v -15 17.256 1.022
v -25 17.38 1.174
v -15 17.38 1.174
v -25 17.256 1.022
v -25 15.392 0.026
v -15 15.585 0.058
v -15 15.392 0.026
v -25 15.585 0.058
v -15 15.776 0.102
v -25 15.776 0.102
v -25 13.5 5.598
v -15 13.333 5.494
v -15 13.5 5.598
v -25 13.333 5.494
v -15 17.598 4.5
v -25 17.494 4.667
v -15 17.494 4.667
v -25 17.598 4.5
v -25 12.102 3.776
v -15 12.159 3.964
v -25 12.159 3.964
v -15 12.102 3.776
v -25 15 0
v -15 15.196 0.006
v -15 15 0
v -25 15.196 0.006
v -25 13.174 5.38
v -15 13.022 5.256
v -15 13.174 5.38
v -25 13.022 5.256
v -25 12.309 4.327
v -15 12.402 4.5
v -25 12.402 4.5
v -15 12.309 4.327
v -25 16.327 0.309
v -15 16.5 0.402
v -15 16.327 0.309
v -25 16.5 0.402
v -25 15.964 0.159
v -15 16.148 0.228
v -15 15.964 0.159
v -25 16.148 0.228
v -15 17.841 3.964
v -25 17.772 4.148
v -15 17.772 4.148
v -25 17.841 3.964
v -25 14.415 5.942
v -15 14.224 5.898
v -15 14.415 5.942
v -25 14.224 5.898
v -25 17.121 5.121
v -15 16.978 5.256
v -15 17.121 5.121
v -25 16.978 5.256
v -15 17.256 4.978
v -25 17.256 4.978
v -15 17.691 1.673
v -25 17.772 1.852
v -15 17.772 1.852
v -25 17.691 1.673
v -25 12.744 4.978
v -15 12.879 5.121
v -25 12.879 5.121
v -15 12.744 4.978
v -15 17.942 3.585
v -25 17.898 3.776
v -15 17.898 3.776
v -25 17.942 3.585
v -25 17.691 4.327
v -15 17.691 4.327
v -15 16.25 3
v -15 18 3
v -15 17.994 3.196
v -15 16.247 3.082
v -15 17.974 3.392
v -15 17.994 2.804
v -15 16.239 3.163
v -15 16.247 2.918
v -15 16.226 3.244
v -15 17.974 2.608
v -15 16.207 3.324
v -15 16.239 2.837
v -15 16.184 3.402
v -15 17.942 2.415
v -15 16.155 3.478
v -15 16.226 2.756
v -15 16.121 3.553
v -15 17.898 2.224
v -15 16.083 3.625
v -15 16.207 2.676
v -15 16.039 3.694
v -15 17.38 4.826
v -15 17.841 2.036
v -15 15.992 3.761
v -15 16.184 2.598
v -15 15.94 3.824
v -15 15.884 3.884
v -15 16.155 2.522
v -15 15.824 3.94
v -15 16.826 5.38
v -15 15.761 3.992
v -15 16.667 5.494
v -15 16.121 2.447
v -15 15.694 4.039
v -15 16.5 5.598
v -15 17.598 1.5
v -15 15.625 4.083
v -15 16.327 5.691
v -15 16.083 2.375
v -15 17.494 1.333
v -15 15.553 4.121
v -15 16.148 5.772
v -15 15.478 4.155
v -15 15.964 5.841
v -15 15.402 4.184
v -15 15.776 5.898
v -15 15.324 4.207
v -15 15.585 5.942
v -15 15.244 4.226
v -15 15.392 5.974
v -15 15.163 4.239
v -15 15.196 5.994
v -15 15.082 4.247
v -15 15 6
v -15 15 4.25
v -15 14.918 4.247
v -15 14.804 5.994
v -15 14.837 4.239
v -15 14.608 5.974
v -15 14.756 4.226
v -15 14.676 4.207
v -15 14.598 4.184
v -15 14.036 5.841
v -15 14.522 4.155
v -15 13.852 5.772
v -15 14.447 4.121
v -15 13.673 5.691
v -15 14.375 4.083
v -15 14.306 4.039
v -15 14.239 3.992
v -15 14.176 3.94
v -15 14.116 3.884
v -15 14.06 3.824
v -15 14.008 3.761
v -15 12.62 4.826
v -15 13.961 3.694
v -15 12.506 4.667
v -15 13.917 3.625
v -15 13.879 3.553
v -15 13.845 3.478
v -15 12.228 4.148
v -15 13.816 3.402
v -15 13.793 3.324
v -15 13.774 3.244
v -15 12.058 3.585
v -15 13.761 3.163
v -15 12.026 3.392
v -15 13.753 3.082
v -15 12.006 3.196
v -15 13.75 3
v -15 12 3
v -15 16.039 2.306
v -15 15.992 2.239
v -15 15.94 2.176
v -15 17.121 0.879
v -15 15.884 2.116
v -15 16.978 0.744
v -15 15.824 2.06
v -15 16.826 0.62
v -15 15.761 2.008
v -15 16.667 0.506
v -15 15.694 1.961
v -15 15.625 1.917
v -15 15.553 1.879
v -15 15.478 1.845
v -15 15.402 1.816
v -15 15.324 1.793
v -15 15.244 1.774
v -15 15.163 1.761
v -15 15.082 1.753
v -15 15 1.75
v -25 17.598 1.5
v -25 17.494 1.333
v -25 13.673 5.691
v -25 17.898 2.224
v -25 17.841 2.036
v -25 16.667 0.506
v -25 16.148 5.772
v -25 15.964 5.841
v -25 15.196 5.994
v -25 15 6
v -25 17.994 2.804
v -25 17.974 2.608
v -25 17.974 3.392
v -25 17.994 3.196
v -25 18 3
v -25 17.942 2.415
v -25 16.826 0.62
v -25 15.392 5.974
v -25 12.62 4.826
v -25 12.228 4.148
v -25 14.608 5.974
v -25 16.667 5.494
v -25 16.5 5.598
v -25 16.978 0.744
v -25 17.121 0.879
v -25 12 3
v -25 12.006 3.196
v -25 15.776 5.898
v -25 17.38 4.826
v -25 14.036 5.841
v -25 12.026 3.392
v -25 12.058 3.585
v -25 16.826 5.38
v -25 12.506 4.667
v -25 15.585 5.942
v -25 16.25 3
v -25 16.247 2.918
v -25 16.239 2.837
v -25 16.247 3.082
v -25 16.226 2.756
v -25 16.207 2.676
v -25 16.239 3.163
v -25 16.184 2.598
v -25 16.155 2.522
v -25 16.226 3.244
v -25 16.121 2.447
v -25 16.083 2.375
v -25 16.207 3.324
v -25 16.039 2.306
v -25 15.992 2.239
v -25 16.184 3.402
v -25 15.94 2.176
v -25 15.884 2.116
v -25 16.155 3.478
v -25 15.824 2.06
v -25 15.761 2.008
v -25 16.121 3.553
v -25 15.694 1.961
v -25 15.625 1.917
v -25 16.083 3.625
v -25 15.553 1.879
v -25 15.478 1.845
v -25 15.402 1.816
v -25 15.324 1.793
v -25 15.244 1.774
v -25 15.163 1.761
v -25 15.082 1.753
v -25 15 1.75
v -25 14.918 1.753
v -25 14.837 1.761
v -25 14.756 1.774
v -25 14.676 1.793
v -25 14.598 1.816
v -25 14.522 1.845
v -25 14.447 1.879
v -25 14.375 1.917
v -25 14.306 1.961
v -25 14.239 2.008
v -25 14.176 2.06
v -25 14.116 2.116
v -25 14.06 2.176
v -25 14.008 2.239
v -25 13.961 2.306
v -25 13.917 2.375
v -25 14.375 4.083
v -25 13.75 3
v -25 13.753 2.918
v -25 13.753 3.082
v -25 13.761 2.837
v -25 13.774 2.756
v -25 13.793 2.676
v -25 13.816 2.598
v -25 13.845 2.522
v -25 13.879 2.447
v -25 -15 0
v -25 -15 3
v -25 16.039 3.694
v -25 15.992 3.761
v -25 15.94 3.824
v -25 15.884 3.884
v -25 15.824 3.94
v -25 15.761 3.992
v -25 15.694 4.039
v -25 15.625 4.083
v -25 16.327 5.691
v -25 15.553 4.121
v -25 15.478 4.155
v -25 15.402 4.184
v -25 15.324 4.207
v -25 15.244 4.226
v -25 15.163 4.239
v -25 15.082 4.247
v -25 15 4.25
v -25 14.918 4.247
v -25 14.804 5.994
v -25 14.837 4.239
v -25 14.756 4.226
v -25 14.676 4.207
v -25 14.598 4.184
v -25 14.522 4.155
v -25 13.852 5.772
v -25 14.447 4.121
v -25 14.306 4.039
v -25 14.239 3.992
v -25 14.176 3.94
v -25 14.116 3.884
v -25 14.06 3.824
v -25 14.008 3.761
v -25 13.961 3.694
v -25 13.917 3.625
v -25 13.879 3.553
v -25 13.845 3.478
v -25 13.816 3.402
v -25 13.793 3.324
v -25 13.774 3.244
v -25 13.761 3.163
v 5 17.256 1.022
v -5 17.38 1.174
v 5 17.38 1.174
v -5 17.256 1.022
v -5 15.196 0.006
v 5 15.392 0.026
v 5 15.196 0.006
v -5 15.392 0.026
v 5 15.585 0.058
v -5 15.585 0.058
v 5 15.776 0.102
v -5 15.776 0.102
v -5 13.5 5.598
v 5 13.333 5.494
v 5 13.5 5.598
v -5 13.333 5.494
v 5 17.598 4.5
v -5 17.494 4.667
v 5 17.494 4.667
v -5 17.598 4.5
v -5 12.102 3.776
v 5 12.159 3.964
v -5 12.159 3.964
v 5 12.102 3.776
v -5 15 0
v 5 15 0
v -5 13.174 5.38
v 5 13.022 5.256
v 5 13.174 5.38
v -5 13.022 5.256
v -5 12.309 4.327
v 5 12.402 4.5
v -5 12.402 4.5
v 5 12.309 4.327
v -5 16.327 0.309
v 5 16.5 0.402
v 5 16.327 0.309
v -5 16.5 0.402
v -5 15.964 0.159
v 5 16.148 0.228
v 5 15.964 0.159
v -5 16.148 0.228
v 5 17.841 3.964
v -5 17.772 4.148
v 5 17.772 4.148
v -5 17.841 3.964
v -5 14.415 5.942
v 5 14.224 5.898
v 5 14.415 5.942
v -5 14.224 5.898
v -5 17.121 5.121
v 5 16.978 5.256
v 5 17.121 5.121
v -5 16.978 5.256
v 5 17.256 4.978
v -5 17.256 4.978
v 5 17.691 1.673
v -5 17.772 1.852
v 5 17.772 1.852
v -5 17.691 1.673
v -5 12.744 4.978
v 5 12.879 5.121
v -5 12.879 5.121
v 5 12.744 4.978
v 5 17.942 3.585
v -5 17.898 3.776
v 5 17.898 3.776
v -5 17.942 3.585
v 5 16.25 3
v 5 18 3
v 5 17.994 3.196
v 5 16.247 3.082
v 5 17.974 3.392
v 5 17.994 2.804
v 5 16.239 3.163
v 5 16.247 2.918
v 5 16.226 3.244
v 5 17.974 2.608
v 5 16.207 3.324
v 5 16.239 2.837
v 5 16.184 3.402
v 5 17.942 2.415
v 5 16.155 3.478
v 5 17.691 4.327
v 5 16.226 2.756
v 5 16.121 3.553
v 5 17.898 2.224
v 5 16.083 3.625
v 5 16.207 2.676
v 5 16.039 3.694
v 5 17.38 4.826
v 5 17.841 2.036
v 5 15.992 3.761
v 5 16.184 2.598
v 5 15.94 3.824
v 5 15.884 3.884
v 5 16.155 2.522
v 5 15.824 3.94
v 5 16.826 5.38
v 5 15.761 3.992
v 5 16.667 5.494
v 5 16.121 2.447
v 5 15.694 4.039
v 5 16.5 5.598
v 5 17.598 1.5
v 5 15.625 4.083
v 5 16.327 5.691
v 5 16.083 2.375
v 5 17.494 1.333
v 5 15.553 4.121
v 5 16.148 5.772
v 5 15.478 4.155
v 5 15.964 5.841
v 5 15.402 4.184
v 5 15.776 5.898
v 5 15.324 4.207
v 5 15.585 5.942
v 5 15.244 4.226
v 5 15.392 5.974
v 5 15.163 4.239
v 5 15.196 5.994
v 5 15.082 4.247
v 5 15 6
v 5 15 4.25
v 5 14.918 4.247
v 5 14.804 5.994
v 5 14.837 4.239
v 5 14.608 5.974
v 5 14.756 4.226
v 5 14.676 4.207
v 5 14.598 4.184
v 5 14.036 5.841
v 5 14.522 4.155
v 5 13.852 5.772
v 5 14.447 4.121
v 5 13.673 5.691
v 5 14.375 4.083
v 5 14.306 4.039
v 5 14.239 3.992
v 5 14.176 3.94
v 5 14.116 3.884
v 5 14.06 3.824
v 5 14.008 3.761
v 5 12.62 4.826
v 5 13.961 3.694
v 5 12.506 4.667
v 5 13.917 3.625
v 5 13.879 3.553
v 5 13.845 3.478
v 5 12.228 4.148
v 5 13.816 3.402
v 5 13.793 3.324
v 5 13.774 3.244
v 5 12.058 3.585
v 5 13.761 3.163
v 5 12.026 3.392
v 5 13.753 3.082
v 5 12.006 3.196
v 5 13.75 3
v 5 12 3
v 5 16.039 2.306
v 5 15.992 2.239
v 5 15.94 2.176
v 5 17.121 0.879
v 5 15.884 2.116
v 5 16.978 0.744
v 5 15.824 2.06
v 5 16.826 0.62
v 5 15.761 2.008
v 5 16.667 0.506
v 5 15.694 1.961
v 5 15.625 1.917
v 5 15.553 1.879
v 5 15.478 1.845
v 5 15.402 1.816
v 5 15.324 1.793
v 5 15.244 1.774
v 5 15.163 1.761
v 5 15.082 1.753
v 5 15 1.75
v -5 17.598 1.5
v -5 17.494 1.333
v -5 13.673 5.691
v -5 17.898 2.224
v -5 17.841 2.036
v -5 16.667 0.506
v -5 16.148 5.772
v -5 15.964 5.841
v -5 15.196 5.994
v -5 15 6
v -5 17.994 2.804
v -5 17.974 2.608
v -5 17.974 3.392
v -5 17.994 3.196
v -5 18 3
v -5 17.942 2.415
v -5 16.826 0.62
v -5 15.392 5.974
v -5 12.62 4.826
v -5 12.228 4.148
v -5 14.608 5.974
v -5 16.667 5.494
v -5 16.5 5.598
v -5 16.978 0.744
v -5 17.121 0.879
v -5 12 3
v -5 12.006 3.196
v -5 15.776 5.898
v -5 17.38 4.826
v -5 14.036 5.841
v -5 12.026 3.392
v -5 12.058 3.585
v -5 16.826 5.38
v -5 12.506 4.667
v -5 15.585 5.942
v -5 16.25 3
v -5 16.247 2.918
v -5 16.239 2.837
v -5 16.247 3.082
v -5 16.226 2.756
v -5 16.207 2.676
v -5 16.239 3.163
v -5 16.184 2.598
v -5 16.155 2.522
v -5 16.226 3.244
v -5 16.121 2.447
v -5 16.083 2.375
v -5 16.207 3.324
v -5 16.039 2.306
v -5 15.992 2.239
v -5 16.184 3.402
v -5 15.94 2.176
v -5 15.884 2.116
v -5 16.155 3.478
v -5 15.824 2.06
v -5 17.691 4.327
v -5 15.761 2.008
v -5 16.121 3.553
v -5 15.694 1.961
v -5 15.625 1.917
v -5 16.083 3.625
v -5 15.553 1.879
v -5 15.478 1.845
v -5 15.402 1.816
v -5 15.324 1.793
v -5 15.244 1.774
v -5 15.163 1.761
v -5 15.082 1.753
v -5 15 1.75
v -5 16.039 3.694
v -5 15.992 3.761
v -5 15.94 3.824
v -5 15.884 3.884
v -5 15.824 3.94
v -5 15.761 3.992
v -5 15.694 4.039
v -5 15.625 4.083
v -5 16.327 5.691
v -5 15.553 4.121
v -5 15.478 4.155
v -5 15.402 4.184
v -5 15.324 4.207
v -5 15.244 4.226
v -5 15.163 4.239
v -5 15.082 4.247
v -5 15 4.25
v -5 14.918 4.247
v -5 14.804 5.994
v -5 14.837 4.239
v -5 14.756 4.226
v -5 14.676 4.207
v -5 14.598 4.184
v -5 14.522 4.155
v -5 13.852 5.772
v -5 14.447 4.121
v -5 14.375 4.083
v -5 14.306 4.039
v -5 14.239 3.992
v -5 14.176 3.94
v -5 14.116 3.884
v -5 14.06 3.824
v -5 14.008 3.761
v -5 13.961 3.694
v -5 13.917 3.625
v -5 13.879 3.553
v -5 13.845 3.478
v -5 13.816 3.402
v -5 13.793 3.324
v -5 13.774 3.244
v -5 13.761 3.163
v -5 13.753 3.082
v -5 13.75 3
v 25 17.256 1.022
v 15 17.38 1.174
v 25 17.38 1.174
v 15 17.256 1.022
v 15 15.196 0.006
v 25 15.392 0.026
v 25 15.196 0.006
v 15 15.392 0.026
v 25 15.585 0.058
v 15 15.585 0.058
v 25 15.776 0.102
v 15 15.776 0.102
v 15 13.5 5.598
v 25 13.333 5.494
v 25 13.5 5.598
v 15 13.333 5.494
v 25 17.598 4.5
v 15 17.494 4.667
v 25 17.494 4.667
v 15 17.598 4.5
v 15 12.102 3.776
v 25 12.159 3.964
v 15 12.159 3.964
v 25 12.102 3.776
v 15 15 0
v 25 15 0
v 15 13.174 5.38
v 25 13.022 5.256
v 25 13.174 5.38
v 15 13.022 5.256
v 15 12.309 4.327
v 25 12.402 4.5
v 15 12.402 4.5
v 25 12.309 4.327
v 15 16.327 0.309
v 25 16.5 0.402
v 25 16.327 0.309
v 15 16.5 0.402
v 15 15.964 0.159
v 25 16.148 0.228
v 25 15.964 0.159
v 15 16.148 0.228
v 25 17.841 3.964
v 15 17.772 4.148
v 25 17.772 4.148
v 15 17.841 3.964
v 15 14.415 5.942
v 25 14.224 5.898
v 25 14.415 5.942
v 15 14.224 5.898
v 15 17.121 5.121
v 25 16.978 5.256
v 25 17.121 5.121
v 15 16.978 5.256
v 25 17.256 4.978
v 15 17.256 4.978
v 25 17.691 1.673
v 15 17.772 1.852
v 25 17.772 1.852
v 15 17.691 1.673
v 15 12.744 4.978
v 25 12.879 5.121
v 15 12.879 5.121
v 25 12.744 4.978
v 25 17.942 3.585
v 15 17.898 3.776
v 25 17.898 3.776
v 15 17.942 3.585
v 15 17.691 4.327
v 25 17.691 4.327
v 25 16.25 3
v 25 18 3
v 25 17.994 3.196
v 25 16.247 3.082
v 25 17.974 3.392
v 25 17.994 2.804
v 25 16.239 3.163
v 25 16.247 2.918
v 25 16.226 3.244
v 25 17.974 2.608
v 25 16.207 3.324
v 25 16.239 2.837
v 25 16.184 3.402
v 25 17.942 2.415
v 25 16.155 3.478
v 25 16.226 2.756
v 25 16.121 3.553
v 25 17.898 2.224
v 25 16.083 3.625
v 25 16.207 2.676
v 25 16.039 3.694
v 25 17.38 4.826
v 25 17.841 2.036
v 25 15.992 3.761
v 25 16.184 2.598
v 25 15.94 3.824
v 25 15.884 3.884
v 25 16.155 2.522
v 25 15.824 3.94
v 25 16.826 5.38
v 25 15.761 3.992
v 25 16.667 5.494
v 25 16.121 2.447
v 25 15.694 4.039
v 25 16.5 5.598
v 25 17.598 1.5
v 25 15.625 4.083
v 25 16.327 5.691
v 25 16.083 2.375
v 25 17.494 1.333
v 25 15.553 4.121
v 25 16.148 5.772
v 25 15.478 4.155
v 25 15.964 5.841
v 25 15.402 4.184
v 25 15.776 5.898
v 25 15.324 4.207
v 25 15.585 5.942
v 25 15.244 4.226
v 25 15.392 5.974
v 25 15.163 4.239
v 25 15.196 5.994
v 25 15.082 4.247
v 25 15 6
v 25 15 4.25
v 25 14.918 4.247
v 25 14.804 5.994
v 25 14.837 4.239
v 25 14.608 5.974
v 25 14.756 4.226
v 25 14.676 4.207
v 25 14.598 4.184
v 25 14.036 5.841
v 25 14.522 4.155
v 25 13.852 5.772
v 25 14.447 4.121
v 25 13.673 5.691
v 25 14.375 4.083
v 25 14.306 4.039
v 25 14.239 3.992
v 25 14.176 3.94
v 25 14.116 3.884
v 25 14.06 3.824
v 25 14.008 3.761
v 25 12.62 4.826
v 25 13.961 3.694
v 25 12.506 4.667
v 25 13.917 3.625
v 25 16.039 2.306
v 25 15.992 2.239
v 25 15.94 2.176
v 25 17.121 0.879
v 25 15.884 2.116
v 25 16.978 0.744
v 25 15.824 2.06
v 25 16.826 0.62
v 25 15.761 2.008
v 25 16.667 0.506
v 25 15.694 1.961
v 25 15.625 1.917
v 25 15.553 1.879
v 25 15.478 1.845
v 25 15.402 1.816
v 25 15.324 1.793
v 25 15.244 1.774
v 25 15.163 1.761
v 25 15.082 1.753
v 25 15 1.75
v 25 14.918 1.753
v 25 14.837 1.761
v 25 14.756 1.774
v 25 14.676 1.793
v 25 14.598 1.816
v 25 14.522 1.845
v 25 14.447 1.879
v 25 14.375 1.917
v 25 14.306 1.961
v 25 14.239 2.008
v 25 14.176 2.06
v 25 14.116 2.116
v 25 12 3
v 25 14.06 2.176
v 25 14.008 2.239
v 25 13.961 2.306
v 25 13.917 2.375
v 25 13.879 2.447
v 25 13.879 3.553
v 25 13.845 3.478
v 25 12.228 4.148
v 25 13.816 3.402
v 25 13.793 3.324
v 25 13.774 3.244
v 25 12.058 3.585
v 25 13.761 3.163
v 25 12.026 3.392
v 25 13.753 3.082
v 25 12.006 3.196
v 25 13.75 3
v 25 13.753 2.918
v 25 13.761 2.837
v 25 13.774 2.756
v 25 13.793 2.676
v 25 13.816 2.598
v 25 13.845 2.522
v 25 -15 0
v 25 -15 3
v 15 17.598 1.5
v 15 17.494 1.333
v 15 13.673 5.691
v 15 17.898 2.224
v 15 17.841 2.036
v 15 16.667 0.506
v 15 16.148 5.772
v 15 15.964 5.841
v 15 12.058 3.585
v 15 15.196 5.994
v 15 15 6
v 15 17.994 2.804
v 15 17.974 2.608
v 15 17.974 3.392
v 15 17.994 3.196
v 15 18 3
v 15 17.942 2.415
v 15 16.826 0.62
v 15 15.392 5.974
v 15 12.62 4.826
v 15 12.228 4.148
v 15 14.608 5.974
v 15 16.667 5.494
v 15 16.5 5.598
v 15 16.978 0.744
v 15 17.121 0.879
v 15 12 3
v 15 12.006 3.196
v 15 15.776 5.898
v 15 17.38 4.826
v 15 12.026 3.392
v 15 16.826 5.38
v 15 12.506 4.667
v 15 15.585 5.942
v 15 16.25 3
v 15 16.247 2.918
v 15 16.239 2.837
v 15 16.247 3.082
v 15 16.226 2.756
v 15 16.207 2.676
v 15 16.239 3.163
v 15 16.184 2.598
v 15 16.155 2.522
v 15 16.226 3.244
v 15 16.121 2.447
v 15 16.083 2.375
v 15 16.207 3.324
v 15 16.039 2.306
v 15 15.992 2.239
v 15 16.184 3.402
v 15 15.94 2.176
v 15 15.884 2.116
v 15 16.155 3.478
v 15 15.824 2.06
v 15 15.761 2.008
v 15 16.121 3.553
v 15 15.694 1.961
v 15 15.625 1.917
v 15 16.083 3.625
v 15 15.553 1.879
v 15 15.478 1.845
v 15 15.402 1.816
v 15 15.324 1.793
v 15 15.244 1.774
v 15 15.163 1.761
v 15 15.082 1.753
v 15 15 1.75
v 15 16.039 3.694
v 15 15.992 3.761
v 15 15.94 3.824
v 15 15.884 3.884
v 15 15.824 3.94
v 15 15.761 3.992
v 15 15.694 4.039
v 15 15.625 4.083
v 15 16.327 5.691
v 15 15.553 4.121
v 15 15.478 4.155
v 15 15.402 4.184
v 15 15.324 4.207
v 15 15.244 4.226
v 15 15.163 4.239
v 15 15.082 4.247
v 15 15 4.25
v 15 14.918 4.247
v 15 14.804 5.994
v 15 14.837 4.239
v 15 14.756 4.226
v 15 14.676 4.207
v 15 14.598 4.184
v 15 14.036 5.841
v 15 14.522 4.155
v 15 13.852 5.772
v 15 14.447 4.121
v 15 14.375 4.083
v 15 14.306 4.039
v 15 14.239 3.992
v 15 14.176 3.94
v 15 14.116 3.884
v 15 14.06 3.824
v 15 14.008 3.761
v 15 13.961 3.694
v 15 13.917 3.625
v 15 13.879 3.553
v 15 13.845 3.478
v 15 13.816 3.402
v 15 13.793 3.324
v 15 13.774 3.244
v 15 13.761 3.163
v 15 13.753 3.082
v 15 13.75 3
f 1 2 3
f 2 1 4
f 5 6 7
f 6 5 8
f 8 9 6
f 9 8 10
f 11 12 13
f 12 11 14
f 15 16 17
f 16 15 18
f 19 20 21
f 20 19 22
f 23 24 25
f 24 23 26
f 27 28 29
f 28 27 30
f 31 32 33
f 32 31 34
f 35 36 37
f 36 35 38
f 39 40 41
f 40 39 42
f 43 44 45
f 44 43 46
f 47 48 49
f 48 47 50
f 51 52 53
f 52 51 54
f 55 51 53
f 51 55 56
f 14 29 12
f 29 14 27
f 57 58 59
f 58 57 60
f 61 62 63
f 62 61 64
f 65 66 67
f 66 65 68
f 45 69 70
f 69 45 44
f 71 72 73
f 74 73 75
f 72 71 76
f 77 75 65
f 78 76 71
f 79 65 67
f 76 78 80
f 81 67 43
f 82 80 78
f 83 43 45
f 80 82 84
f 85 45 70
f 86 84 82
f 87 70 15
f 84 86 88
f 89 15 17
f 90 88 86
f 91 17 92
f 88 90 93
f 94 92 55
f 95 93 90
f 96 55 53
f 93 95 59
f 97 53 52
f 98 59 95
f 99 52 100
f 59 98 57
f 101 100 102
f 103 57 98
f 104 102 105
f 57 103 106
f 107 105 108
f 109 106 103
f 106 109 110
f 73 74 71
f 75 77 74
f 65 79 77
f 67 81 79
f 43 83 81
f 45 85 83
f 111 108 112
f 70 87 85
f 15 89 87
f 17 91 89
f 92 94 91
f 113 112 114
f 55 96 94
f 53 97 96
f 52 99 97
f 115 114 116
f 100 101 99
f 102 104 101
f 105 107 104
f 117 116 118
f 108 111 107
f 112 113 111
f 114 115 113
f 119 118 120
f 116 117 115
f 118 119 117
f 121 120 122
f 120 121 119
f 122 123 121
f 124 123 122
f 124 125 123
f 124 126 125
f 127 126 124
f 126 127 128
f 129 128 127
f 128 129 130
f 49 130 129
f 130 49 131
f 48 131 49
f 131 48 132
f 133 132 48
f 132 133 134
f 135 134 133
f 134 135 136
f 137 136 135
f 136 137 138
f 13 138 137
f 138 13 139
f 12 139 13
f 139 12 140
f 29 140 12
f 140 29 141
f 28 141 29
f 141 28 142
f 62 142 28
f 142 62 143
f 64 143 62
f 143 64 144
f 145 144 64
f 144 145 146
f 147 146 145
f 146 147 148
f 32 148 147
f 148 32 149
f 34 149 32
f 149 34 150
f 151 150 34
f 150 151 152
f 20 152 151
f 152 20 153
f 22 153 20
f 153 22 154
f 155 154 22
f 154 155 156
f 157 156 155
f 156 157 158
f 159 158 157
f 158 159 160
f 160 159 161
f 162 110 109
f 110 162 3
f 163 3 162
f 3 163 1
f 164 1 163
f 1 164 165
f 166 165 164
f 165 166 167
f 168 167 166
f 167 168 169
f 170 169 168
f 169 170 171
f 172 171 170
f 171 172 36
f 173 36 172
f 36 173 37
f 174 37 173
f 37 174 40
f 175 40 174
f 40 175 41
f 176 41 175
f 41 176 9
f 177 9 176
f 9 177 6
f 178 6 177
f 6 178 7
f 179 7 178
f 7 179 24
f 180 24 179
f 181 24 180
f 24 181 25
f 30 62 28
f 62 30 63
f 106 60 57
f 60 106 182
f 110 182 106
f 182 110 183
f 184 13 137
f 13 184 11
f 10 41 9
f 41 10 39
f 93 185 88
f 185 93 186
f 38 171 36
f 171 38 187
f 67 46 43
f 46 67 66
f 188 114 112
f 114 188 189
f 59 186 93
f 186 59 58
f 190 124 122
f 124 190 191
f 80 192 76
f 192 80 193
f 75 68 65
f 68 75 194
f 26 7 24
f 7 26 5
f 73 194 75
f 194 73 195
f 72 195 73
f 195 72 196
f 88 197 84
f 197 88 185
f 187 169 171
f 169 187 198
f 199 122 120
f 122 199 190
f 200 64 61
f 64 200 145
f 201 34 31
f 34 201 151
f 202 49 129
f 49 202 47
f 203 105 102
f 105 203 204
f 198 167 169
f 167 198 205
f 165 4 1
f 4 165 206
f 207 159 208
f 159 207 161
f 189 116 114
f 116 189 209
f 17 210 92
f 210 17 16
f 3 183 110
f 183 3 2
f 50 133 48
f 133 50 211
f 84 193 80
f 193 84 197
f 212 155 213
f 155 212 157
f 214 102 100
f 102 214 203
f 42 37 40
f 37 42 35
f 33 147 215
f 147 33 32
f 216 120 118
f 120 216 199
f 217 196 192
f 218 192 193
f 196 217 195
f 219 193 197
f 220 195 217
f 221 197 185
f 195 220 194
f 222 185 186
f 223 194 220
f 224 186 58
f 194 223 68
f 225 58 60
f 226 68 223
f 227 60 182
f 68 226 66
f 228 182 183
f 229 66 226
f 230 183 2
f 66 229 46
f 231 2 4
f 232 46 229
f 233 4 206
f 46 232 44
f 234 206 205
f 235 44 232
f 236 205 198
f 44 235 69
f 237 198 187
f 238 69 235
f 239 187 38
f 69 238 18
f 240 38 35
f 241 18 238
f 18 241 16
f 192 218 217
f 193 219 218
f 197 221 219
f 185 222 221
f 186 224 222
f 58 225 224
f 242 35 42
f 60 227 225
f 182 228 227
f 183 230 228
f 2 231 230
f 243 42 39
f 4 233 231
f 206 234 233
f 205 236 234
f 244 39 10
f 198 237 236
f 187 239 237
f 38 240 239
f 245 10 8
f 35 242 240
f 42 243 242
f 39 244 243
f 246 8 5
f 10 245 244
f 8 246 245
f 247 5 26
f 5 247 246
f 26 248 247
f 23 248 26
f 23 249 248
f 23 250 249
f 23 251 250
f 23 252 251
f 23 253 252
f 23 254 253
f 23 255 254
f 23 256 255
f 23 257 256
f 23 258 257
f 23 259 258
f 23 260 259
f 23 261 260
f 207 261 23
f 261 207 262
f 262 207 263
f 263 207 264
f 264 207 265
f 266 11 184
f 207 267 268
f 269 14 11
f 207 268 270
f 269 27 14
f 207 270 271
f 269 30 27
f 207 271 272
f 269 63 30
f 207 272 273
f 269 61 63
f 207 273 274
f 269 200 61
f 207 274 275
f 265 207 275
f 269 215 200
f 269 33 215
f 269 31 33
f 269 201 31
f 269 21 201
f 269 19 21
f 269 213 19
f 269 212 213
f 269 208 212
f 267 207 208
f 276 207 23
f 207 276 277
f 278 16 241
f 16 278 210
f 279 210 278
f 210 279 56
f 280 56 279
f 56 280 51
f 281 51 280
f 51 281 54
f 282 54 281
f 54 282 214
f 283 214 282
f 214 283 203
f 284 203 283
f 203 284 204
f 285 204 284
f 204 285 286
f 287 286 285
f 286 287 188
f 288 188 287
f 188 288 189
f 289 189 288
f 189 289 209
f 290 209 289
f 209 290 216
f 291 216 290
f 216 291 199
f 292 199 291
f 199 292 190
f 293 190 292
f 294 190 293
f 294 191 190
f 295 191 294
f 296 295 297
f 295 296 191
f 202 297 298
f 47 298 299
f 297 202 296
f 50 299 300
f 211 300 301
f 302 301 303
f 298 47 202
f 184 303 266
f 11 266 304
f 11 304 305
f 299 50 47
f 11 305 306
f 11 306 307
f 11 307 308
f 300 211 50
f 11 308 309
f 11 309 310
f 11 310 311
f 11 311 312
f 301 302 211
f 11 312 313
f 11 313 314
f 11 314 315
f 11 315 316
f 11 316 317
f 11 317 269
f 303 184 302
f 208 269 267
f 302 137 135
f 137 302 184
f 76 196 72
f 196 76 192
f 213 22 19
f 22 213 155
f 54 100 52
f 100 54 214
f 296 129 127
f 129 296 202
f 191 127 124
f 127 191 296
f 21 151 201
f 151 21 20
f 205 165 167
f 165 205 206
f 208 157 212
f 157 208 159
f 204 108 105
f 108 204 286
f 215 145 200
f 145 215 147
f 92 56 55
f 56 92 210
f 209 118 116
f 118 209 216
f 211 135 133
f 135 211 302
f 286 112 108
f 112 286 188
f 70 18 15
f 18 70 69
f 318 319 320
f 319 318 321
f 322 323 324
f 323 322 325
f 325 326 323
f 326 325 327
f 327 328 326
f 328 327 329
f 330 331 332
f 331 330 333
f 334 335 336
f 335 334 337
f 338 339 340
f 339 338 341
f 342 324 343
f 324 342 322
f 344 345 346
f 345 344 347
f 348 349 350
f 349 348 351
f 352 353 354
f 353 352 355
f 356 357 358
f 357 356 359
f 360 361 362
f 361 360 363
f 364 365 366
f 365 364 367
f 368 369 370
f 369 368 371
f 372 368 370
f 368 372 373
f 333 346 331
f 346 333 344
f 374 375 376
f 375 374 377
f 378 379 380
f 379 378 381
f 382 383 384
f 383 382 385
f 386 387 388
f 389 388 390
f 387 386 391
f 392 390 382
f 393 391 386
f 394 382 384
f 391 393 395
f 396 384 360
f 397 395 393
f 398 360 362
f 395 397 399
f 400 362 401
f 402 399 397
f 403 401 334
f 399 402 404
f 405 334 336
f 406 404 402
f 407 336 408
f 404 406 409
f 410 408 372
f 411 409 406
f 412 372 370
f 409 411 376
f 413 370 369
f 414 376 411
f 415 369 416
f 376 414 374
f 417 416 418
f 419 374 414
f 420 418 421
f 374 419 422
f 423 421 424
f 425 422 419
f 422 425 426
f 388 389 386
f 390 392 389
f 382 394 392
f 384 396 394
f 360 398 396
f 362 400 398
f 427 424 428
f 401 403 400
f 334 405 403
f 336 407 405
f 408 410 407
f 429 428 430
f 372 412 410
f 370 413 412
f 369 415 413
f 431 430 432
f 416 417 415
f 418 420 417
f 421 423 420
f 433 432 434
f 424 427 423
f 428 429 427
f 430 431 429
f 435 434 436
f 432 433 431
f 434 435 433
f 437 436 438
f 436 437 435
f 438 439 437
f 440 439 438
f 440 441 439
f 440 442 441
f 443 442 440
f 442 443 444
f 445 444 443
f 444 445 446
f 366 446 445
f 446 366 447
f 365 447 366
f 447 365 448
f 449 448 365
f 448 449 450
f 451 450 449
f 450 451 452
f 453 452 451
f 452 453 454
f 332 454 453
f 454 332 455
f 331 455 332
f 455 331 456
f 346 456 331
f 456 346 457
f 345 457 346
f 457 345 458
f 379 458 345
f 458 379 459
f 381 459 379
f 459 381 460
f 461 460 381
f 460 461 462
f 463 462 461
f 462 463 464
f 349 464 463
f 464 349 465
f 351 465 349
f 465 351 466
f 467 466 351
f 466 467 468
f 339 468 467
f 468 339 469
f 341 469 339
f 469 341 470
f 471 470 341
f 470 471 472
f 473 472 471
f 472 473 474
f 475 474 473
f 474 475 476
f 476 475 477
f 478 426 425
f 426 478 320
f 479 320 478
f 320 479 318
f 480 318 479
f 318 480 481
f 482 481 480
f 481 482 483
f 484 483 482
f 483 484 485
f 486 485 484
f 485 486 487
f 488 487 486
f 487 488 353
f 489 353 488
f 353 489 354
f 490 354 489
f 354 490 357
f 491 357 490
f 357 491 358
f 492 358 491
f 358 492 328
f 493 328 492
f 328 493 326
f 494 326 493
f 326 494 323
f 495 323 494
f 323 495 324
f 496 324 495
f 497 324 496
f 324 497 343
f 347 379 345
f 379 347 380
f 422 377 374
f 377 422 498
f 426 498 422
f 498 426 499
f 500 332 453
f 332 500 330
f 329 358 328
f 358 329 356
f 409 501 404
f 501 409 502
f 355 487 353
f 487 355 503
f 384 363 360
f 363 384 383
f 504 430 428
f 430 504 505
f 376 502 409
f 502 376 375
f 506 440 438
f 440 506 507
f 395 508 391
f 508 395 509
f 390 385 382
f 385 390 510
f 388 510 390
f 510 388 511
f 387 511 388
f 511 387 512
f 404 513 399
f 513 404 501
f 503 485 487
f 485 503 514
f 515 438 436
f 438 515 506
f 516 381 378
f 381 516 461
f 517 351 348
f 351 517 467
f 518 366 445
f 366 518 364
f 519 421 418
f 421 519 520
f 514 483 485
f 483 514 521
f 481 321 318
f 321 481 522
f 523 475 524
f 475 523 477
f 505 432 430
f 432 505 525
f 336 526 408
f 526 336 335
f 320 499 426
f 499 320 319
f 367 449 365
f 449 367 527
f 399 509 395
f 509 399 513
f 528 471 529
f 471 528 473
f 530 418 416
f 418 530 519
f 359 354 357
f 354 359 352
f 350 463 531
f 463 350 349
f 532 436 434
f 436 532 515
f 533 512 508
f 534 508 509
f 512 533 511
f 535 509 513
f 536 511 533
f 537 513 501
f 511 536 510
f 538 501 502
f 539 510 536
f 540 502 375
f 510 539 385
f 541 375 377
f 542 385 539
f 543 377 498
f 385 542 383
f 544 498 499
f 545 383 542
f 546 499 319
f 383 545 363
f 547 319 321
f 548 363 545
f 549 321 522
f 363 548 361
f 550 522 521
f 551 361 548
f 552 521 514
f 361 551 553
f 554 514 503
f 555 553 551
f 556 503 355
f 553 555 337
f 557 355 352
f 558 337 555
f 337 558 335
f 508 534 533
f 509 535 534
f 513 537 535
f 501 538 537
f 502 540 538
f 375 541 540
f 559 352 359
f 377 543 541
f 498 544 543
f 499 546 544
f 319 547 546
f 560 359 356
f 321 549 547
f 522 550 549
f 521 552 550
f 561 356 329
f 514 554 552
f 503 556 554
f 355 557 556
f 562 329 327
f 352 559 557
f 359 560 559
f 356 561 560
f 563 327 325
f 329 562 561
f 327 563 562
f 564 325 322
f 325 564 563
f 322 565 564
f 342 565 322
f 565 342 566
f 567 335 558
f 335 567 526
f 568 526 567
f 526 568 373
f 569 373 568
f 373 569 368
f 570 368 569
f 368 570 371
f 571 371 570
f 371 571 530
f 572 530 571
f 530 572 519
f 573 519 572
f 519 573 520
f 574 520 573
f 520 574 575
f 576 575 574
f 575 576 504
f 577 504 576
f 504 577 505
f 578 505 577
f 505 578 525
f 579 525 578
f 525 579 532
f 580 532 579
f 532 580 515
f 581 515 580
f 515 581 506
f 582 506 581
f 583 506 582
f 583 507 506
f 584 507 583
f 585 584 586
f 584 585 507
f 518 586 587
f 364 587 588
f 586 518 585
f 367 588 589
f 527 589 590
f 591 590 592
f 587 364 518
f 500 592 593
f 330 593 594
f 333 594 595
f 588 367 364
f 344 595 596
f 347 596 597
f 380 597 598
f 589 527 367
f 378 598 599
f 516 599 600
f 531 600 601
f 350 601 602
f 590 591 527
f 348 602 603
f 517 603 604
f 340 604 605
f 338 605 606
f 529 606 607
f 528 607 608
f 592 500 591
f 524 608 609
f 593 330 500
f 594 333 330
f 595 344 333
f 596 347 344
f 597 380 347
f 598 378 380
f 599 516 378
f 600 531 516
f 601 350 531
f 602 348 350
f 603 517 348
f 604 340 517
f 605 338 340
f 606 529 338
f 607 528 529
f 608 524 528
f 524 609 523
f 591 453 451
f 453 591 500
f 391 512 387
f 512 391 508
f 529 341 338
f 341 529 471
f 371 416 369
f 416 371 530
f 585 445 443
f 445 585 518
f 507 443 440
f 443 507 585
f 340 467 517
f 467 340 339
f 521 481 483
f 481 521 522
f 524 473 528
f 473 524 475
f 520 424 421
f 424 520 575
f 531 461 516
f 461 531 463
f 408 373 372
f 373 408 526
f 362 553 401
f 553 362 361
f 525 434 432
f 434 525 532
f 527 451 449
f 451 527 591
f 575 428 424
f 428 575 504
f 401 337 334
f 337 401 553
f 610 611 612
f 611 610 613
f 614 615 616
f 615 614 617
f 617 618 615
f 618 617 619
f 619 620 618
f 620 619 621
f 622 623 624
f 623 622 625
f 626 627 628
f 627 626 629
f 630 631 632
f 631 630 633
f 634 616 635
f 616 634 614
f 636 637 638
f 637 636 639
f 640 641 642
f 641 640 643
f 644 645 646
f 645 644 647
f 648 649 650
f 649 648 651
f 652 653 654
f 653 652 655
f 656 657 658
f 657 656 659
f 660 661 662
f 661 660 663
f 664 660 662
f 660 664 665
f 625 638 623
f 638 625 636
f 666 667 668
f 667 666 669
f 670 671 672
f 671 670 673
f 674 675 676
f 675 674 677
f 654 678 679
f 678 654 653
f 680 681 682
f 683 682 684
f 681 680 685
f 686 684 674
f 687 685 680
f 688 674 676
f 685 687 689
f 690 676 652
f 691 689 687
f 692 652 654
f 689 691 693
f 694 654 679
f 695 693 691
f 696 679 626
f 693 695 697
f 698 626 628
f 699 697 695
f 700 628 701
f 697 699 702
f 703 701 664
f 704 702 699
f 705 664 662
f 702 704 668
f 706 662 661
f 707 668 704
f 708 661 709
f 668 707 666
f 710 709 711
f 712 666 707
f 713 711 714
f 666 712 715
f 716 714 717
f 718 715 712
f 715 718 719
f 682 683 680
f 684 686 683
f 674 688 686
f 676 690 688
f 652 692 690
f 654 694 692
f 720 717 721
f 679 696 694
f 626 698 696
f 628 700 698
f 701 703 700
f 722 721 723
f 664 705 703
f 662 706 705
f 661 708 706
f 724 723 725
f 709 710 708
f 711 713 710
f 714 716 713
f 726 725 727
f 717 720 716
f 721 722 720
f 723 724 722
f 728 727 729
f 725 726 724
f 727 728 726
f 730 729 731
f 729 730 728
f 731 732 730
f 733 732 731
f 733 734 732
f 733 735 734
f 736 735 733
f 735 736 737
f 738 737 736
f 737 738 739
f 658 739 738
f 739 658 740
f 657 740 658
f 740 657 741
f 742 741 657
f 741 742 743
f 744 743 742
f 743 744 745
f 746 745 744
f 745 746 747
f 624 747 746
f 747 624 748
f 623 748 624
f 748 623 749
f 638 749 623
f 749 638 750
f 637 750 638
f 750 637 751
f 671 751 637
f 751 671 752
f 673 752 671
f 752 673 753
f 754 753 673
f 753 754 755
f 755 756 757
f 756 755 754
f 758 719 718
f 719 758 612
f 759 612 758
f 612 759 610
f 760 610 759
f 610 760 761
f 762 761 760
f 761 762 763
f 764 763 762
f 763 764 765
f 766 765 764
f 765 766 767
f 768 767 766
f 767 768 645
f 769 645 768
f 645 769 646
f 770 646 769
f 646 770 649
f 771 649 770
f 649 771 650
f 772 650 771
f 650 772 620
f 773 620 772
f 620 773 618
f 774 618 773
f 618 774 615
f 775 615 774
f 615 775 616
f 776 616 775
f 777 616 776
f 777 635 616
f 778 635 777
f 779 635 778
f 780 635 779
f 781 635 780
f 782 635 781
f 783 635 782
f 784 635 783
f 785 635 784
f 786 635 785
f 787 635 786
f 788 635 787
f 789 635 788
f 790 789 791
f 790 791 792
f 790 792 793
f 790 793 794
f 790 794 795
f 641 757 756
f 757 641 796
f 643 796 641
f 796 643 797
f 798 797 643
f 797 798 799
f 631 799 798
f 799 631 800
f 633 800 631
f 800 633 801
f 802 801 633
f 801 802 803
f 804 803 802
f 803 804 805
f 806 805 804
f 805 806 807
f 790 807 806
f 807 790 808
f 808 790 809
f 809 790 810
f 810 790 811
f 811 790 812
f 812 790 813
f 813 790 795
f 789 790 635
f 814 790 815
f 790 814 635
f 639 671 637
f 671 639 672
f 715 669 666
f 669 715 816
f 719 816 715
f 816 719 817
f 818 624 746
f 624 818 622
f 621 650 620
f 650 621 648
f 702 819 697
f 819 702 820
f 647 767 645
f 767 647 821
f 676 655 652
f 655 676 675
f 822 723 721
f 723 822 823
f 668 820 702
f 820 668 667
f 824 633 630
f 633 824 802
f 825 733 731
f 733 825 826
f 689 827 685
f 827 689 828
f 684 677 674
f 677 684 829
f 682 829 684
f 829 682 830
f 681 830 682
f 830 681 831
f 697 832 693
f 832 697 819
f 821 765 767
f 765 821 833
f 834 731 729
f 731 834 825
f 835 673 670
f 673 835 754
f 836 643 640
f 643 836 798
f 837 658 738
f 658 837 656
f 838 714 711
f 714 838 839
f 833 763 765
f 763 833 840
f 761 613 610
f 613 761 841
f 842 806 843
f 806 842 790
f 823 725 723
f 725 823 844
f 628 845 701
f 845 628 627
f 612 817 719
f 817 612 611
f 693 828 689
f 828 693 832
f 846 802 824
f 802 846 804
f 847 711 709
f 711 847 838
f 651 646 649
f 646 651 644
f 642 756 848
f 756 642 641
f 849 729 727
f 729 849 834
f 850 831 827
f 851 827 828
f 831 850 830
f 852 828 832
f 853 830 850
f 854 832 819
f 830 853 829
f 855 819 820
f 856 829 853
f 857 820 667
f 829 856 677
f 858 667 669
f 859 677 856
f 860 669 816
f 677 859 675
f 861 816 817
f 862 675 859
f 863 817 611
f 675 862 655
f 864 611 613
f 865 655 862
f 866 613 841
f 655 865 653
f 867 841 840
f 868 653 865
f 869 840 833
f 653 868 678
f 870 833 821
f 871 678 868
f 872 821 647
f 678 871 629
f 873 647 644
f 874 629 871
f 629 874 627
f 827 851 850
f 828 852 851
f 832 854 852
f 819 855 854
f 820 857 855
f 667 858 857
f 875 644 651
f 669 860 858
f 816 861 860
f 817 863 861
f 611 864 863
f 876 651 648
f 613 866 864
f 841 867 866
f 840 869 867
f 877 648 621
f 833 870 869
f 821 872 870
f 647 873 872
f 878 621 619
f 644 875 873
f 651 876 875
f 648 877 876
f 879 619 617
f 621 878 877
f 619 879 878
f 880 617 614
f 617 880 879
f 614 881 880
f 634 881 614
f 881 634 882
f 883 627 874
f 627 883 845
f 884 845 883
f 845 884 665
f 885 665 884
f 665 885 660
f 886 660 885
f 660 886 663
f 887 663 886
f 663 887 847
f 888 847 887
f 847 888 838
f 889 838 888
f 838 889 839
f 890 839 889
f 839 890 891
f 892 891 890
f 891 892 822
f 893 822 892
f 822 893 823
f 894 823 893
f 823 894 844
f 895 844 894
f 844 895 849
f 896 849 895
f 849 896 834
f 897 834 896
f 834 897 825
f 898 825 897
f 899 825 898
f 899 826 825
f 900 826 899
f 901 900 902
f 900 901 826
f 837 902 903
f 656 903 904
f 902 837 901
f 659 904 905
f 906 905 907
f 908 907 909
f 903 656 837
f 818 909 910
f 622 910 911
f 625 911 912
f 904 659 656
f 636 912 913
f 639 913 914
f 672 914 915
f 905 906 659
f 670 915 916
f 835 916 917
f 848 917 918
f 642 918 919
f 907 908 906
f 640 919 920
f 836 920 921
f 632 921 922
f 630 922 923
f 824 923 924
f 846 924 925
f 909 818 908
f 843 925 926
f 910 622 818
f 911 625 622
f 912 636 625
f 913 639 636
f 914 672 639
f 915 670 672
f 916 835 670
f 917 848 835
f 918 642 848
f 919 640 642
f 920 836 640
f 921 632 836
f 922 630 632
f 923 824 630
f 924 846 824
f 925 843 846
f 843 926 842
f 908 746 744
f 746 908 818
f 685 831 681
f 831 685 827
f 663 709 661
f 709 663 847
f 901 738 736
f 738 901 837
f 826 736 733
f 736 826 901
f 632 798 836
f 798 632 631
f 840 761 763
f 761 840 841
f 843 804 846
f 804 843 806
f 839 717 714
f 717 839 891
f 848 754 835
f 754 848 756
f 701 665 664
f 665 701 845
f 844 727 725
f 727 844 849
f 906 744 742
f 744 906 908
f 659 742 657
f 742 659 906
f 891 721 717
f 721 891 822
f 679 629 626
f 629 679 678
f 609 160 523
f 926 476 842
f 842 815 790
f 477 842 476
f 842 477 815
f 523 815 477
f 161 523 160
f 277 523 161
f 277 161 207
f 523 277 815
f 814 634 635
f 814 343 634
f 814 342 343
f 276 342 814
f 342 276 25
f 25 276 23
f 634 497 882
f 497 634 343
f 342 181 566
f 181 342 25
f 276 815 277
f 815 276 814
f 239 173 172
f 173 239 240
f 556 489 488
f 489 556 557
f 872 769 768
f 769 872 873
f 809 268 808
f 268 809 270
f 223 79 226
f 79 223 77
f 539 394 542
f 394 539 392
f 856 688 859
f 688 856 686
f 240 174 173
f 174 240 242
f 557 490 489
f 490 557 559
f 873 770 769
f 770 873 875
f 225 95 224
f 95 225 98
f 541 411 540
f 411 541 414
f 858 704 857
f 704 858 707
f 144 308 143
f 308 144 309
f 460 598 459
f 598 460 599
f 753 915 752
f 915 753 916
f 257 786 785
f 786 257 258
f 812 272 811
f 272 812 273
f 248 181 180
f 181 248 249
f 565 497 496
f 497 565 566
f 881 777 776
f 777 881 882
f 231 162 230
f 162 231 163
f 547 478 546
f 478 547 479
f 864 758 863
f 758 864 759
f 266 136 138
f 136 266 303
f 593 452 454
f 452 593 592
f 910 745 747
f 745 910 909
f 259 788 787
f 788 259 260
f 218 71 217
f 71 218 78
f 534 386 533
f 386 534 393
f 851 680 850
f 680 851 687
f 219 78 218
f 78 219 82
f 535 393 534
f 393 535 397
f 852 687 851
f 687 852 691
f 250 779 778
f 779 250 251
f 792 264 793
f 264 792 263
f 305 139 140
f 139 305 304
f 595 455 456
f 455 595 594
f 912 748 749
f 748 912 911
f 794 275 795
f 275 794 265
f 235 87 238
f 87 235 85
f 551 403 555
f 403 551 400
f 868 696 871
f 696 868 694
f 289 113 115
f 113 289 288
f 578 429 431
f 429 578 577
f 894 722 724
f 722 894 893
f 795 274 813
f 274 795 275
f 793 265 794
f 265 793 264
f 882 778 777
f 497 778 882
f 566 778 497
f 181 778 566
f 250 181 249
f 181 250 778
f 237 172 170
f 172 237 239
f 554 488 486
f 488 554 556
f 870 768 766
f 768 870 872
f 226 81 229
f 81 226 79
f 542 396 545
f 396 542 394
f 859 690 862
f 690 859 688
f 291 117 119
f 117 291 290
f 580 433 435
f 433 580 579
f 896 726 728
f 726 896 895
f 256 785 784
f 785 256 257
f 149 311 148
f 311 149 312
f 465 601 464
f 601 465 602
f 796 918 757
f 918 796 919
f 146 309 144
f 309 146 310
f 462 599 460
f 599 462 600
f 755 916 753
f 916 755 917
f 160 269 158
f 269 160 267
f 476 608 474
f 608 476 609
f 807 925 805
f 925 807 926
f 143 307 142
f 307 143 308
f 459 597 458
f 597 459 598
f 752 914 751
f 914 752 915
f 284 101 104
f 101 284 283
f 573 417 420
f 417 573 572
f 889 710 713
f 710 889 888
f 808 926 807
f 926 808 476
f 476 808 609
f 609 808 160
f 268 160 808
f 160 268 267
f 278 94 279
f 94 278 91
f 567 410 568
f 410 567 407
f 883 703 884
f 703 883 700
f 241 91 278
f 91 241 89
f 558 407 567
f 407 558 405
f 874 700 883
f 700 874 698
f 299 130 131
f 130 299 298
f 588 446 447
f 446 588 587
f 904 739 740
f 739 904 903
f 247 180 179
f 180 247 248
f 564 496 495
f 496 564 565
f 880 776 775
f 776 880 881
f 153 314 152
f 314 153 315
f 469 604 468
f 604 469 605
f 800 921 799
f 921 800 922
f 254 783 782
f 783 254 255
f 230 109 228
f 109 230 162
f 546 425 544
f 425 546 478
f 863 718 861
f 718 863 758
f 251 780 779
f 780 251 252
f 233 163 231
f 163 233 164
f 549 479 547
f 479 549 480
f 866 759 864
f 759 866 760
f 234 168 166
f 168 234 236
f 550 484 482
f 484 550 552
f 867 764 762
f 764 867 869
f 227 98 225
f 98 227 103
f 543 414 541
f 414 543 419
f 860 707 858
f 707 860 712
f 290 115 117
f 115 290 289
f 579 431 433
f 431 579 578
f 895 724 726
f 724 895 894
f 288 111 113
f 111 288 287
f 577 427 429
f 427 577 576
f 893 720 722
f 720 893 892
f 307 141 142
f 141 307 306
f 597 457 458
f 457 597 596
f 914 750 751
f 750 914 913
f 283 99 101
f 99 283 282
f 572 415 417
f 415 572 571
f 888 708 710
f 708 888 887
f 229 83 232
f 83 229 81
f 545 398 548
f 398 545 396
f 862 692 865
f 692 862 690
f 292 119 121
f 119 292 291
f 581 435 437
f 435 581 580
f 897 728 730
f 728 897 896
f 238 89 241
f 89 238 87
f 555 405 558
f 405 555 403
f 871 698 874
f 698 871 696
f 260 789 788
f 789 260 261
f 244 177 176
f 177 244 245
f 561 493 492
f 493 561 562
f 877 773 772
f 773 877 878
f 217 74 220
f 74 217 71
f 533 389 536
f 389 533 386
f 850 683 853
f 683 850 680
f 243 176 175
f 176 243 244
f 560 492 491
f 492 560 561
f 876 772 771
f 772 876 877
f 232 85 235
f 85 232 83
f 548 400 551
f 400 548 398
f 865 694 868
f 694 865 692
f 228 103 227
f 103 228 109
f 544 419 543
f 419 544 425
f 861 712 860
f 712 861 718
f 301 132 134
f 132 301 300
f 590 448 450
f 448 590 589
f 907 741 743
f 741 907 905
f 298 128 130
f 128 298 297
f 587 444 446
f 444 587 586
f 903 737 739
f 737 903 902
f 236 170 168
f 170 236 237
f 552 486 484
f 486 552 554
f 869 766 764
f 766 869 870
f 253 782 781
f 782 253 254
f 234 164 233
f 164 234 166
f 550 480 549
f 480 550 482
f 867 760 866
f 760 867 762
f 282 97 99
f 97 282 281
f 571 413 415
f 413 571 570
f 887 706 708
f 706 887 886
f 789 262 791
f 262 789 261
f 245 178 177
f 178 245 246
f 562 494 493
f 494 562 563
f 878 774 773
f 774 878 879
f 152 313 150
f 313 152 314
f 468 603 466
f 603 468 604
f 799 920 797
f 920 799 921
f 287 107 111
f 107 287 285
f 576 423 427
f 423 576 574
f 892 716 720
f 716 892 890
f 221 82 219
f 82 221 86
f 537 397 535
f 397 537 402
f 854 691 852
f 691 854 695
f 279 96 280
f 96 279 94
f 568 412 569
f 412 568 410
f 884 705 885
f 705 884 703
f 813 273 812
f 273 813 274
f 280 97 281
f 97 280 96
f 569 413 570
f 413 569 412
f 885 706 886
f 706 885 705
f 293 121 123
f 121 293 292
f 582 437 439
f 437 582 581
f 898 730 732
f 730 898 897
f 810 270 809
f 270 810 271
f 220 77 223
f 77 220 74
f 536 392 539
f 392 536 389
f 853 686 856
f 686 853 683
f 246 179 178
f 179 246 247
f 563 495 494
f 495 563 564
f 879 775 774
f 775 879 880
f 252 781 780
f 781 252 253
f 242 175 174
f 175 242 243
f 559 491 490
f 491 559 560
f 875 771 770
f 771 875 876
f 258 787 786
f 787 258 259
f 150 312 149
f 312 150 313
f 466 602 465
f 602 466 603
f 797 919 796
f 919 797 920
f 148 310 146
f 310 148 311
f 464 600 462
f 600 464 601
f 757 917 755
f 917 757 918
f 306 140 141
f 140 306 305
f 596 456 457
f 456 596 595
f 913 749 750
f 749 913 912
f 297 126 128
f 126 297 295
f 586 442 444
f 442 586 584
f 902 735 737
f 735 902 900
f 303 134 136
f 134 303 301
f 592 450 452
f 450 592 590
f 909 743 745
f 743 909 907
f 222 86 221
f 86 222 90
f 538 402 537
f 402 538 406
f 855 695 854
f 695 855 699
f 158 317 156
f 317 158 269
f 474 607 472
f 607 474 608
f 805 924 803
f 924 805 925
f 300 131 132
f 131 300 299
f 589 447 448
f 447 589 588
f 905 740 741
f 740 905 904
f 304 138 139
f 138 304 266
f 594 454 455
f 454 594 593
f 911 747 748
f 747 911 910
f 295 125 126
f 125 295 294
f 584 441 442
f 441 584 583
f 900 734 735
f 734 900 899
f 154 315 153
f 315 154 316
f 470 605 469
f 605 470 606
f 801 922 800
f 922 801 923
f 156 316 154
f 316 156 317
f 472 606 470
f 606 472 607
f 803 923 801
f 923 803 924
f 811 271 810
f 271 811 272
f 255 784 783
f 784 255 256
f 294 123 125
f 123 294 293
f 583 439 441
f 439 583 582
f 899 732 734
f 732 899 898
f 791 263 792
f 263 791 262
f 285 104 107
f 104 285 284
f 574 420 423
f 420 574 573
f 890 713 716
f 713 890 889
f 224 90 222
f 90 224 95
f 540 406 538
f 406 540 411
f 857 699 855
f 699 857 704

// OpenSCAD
// Pin hinge leaf: flat plate with three knuckles along the +Y edge
// Units: mm. Print orientation: plate flat on the bed (z = 0).

// ---------------- Parameters ----------------
plate_len    = 50;    // plate length along X
plate_wid    = 30;    // plate width along Y
plate_thk    = 3;     // plate thickness along Z

num_segments = 5;     // number of equal segments along the hinge edge
seg_len      = plate_len / num_segments;  // 10 mm per segment

knuckle_d    = 6;     // knuckle outer diameter
knuckle_y    = 15;    // knuckle axis Y position (at the +Y edge)
knuckle_z    = 3;     // knuckle axis Z position (top of plate)

pin_d        = 2.5;   // pin hole diameter
cut_extra    = 0.5;   // extra length so cutters pass beyond faces

knuckle_segs = [0, 2, 4];  // 0-based indices of segments 1, 3 and 5

$fn = 96;             // smoothness for curved shapes

// ---------------- Model ----------------
difference() {
    union() {
        // Flat plate, centred on origin in X and Y
        translate([-plate_len/2, -plate_wid/2, 0])
            cube([plate_len, plate_wid, plate_thk]);

        // Knuckles on segments 1, 3 and 5
        for (i = knuckle_segs)
            translate([-plate_len/2 + i*seg_len, knuckle_y, knuckle_z])
                rotate([0, 90, 0])
                    cylinder(d = knuckle_d, h = seg_len);
    }

    // Pin hole along the common knuckle axis, through every knuckle
    translate([-plate_len/2 - cut_extra, knuckle_y, knuckle_z])
        rotate([0, 90, 0])
            cylinder(d = pin_d, h = plate_len + 2*cut_extra);
}
